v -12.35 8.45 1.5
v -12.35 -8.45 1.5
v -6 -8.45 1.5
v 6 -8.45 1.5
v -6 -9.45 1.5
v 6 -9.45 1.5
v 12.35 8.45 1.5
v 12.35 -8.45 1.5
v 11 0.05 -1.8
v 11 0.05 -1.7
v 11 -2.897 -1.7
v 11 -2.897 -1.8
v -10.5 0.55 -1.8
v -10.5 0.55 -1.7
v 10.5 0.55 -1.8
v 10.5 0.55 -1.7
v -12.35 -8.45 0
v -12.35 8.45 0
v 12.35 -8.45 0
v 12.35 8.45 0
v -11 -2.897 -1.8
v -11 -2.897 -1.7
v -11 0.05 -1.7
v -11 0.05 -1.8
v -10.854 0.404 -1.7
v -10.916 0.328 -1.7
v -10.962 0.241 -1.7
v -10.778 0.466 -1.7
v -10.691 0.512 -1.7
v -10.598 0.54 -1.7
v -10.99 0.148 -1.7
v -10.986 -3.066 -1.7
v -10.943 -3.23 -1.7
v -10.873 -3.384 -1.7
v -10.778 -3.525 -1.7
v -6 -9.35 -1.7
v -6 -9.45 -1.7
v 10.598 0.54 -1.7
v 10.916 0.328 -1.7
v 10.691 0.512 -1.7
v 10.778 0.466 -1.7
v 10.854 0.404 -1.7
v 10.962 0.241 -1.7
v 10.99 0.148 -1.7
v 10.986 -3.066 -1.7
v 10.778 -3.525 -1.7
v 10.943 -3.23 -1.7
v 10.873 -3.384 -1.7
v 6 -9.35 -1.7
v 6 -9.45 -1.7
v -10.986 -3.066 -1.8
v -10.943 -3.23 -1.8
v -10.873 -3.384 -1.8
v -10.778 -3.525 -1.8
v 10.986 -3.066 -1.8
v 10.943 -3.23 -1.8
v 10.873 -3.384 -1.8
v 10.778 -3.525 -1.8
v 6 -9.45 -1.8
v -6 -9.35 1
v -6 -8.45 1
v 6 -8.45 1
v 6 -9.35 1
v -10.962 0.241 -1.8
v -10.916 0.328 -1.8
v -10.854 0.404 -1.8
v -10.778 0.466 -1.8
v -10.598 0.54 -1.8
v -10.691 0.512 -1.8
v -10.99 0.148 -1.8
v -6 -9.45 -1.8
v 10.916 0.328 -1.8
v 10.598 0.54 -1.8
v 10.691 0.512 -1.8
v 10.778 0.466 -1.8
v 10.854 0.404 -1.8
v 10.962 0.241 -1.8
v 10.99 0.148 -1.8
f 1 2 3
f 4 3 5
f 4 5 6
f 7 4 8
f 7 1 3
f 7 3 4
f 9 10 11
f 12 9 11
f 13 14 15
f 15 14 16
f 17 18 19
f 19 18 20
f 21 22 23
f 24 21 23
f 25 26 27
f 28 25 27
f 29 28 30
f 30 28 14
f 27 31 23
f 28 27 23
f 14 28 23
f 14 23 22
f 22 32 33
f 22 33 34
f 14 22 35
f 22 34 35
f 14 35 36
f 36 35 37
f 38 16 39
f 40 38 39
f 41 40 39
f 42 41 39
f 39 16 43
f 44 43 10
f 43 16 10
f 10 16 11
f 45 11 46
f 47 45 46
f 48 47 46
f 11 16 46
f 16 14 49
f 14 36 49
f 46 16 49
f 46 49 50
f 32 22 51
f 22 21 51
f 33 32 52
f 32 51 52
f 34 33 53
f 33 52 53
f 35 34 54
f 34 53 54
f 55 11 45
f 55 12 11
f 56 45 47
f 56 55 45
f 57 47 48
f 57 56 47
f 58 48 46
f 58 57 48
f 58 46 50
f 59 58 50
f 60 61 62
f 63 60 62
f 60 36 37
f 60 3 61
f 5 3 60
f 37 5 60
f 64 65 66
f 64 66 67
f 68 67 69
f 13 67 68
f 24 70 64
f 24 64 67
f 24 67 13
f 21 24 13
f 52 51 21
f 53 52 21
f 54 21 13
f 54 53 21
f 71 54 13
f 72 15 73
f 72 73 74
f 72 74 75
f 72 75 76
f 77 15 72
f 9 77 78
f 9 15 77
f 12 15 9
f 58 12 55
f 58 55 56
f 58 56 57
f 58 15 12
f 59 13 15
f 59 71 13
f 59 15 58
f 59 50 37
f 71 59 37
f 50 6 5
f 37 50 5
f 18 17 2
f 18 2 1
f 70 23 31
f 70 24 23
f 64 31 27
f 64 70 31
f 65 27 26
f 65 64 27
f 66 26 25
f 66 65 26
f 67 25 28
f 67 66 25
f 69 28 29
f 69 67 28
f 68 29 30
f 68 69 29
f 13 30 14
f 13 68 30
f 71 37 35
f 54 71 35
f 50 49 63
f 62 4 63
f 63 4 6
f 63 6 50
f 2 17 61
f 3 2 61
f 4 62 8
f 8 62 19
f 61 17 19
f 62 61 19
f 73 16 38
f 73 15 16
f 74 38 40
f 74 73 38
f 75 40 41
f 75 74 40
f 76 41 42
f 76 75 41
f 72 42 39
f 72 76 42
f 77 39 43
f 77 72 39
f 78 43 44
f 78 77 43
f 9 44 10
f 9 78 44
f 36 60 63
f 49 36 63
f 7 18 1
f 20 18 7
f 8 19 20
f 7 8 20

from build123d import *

# Parameters (mm, degrees)
SKETCH_W     = 24.7
SKETCH_H     = 16.9
PAD_DEPTH    = 1.5
SKETCH001_W  = 21.744
SKETCH001_H  = 10.864
PAD001_DEPTH = 1
SKETCH002_W  = 12
SKETCH002_H  = 0.5
PAD002_DEPTH = 1
SKETCH003_W  = 12
SKETCH003_H  = 0.1
PAD003_DEPTH = 2.7
PAD004_DEPTH = 0.1
FILLET_R     = 0.5
FILLET001_R  = 1
FILLET002_R  = 1


with BuildPart() as part:
    # Sketch → Pad (new body)
    with BuildSketch(Plane.XY):
        Rectangle(SKETCH_W, SKETCH_H)
    extrude(amount=PAD_DEPTH)

    # Sketch001 (on Face6 of Pad) → Pad001 (join)
    with BuildSketch(Plane.XY.offset(1.5)):
        with Locations((0, 1)):
            Rectangle(SKETCH001_W, SKETCH001_H)
        with BuildLine():
            ThreePointArc((-4.565, -6.012), (-5.065, -6.512), (-4.565, -7.012))
            Line((-4.565, -7.012), (4.565, -7.012))
            ThreePointArc((4.565, -7.012), (5.065, -6.512), (4.565, -6.012))
            Line((4.565, -6.012), (-4.565, -6.012))
        make_face()
    extrude(amount=-PAD001_DEPTH)

    # Sketch002 (on Face6 of Pad001) → Pad002 (join)
    with BuildSketch(Plane.XZ.offset(8.45)):
        with Locations((0, 1.25)):
            Rectangle(SKETCH002_W, SKETCH002_H)
    extrude(amount=PAD002_DEPTH)

    # Sketch003 (on Face11 of Pad002) → Pad003 (join)
    with BuildSketch(Plane(origin=(0, 0, 1), x_dir=(1, 0, 0), z_dir=(0, 0, -1))):
        with Locations((0, 9.4)):
            Rectangle(SKETCH003_W, SKETCH003_H)
    extrude(amount=PAD003_DEPTH)

    # Sketch004 (on Face18 of Pad003) → Pad004 (join)
    with BuildSketch(Plane(origin=(0, 0, -1.7), x_dir=(1, 0, 0), z_dir=(0, 0, -1))):
        Polygon((-6, 9.45), (-11, 3.25), (-11, -0.55), (11, -0.55), (11, 3.25), (6, 9.45), align=None)
    extrude(amount=PAD004_DEPTH)

    # Fillet
    fillet_edges = [part.edges().sort_by_distance(p)[0] for p in [
        (-11, 0.55, -1.75),
        (11, 0.55, -1.75),
    ]]
    fillet(fillet_edges, radius=FILLET_R)

    # Fillet001
    fillet001_edges = [part.edges().sort_by_distance(p)[0] for p in [
        (-11, -3.25, -1.75),
    ]]
    fillet(fillet001_edges, radius=FILLET001_R)

    # Fillet002
    fillet002_edges = [part.edges().sort_by_distance(p)[0] for p in [
        (11, -3.25, -1.75),
    ]]
    fillet(fillet002_edges, radius=FILLET002_R)


solid = part.part
